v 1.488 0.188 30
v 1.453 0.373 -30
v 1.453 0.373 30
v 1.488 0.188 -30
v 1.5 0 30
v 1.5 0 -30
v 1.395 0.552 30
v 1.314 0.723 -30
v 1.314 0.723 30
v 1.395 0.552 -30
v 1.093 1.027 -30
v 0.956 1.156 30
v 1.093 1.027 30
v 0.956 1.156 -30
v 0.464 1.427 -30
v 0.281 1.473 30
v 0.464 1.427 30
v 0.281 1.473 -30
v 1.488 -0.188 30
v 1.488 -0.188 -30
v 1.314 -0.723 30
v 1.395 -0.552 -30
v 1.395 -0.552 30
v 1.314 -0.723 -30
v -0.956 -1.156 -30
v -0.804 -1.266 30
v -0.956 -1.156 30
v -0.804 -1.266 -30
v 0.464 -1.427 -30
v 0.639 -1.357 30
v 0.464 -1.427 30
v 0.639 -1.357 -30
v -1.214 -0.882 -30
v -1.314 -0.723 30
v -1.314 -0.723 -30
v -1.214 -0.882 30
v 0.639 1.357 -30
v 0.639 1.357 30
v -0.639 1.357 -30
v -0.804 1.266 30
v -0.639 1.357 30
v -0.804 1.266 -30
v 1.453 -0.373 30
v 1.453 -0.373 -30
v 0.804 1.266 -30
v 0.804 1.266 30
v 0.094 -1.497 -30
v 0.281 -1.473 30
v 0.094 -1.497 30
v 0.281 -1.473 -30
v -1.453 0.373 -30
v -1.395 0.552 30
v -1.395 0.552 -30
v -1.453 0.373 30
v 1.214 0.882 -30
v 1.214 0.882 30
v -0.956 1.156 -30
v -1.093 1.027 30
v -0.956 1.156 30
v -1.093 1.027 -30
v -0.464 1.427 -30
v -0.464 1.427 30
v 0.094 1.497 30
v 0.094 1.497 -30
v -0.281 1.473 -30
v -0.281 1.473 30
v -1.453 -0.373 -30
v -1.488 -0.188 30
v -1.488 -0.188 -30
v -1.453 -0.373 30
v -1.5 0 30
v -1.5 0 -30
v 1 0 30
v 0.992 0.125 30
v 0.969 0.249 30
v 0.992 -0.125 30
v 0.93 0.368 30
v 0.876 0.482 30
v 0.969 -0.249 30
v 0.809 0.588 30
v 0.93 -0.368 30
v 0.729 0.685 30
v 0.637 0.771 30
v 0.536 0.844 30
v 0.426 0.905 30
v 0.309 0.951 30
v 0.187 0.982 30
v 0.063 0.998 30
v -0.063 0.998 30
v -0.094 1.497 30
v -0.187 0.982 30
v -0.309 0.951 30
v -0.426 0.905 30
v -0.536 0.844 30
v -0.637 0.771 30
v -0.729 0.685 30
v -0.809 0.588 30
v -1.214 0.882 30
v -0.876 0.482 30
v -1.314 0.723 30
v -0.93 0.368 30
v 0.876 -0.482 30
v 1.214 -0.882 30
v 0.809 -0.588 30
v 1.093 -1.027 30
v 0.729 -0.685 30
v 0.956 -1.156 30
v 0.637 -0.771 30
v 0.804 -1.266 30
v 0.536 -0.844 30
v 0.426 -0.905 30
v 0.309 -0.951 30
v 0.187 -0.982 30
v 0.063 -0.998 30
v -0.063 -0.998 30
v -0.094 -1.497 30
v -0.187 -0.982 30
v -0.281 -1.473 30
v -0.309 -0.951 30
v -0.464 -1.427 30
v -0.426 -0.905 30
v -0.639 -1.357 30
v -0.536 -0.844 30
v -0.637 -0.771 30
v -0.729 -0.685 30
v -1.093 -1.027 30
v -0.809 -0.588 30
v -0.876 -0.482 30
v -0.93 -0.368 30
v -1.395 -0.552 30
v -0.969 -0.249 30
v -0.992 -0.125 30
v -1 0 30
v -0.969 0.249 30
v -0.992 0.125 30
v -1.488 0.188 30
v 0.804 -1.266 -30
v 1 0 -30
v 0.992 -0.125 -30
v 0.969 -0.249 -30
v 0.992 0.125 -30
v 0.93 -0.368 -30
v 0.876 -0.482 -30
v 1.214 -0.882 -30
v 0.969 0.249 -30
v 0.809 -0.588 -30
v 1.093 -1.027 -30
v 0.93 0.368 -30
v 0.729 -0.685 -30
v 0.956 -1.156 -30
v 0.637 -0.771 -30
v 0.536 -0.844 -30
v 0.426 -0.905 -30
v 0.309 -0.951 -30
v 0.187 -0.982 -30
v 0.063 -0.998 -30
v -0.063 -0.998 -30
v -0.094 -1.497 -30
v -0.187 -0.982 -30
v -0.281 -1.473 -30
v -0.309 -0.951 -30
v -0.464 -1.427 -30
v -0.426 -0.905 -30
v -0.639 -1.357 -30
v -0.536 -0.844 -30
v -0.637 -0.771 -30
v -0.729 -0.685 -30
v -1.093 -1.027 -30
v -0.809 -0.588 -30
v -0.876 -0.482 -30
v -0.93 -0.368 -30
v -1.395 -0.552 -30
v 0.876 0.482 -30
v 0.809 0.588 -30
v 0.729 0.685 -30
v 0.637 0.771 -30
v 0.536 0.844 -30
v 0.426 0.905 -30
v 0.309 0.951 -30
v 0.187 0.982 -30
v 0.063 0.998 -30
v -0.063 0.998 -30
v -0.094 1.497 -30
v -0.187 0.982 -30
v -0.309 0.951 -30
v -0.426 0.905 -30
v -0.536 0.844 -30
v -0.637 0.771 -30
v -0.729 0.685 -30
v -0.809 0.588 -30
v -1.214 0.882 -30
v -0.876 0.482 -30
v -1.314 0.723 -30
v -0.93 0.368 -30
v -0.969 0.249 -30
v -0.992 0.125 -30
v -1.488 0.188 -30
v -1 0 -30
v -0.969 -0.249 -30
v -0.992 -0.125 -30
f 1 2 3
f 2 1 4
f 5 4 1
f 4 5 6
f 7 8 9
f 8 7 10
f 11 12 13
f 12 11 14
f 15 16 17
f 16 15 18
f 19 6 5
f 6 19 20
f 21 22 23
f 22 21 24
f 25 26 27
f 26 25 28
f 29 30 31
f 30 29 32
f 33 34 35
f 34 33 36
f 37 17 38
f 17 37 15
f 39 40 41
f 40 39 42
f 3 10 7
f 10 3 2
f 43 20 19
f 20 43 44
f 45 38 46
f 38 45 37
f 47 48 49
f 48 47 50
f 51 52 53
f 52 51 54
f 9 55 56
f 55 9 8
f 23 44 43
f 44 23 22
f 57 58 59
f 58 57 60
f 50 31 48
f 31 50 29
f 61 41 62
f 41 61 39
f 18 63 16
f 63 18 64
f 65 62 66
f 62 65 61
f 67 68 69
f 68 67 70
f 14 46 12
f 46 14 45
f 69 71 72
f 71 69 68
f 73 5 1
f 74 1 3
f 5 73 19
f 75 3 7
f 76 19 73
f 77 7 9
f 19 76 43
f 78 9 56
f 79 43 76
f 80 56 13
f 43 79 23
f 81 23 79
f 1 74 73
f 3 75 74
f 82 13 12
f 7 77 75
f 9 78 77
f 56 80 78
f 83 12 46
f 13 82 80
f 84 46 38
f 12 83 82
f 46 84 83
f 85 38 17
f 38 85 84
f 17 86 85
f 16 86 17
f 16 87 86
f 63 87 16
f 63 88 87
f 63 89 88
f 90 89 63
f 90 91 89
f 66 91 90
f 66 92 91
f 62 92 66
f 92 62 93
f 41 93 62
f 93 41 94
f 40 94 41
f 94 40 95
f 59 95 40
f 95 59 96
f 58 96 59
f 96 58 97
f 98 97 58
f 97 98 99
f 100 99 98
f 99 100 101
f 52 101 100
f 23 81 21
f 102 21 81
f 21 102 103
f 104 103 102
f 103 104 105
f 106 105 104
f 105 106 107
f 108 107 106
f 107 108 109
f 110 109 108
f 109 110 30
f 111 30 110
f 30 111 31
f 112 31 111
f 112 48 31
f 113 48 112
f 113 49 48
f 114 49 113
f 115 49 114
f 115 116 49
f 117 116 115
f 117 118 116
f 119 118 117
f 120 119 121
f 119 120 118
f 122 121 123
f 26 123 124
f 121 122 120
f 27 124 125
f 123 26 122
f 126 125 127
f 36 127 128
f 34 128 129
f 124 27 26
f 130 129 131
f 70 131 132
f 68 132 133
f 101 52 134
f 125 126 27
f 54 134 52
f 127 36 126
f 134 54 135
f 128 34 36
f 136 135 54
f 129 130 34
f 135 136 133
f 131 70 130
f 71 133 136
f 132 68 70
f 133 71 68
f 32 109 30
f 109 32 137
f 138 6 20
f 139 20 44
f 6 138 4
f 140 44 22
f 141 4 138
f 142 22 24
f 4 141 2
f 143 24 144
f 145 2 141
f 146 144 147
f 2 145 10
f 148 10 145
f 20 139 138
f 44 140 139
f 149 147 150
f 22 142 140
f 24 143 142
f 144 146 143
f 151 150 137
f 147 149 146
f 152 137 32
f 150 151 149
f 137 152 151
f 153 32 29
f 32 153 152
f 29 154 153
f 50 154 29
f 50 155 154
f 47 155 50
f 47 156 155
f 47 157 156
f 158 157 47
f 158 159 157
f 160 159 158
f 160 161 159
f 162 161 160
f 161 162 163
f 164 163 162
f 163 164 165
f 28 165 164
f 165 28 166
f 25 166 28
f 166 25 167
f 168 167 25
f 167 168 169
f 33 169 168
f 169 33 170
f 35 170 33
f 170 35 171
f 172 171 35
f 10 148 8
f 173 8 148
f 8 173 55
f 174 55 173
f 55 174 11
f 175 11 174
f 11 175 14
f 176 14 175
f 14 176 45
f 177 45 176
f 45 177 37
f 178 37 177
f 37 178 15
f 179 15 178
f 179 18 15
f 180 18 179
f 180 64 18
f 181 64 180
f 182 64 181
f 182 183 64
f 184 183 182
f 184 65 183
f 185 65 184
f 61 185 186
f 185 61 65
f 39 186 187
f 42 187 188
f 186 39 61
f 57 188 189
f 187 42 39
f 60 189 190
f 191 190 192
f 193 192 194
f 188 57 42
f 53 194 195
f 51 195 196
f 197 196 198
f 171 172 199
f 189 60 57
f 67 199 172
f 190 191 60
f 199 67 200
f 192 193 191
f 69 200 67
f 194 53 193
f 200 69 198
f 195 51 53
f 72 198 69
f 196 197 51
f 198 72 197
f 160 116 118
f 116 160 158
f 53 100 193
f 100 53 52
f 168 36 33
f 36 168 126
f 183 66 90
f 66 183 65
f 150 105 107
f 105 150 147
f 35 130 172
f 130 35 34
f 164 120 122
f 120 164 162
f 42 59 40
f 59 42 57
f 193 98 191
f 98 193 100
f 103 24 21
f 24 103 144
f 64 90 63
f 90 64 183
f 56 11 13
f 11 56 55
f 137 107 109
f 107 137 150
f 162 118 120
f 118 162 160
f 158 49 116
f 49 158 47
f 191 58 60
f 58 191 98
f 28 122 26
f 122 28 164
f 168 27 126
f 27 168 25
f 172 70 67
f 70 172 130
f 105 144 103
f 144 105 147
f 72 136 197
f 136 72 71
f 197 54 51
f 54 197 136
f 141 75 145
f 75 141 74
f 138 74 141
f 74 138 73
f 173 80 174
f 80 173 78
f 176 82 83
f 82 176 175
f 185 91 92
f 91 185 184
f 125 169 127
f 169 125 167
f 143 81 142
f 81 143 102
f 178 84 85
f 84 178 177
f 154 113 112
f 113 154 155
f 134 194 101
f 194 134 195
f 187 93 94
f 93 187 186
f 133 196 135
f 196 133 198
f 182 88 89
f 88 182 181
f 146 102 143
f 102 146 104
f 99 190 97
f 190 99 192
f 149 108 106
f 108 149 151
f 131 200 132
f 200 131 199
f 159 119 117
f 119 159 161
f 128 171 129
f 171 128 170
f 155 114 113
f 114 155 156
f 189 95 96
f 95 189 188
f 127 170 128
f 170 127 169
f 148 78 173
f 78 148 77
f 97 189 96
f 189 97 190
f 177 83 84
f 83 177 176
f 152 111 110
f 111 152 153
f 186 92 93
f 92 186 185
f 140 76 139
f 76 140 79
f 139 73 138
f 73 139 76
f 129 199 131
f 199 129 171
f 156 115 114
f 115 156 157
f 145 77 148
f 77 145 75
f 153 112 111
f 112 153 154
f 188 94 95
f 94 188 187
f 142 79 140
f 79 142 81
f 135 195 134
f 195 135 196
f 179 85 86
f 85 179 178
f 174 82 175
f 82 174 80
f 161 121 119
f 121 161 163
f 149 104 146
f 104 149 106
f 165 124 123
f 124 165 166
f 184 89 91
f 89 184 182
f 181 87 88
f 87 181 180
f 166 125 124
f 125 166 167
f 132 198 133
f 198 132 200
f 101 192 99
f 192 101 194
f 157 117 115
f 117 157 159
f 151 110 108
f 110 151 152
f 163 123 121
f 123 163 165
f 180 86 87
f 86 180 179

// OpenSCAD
$fn = 50;


difference() {
	union() {
		translate(v = [0, 0, -30.0000000000]) {
			cylinder(h = 60, r = 1.5000000000);
		}
	}
	union() {
		translate(v = [0, 0, -100.0000000000]) {
			cylinder(h = 200, r = 1.0000000000);
		}
	}
}
